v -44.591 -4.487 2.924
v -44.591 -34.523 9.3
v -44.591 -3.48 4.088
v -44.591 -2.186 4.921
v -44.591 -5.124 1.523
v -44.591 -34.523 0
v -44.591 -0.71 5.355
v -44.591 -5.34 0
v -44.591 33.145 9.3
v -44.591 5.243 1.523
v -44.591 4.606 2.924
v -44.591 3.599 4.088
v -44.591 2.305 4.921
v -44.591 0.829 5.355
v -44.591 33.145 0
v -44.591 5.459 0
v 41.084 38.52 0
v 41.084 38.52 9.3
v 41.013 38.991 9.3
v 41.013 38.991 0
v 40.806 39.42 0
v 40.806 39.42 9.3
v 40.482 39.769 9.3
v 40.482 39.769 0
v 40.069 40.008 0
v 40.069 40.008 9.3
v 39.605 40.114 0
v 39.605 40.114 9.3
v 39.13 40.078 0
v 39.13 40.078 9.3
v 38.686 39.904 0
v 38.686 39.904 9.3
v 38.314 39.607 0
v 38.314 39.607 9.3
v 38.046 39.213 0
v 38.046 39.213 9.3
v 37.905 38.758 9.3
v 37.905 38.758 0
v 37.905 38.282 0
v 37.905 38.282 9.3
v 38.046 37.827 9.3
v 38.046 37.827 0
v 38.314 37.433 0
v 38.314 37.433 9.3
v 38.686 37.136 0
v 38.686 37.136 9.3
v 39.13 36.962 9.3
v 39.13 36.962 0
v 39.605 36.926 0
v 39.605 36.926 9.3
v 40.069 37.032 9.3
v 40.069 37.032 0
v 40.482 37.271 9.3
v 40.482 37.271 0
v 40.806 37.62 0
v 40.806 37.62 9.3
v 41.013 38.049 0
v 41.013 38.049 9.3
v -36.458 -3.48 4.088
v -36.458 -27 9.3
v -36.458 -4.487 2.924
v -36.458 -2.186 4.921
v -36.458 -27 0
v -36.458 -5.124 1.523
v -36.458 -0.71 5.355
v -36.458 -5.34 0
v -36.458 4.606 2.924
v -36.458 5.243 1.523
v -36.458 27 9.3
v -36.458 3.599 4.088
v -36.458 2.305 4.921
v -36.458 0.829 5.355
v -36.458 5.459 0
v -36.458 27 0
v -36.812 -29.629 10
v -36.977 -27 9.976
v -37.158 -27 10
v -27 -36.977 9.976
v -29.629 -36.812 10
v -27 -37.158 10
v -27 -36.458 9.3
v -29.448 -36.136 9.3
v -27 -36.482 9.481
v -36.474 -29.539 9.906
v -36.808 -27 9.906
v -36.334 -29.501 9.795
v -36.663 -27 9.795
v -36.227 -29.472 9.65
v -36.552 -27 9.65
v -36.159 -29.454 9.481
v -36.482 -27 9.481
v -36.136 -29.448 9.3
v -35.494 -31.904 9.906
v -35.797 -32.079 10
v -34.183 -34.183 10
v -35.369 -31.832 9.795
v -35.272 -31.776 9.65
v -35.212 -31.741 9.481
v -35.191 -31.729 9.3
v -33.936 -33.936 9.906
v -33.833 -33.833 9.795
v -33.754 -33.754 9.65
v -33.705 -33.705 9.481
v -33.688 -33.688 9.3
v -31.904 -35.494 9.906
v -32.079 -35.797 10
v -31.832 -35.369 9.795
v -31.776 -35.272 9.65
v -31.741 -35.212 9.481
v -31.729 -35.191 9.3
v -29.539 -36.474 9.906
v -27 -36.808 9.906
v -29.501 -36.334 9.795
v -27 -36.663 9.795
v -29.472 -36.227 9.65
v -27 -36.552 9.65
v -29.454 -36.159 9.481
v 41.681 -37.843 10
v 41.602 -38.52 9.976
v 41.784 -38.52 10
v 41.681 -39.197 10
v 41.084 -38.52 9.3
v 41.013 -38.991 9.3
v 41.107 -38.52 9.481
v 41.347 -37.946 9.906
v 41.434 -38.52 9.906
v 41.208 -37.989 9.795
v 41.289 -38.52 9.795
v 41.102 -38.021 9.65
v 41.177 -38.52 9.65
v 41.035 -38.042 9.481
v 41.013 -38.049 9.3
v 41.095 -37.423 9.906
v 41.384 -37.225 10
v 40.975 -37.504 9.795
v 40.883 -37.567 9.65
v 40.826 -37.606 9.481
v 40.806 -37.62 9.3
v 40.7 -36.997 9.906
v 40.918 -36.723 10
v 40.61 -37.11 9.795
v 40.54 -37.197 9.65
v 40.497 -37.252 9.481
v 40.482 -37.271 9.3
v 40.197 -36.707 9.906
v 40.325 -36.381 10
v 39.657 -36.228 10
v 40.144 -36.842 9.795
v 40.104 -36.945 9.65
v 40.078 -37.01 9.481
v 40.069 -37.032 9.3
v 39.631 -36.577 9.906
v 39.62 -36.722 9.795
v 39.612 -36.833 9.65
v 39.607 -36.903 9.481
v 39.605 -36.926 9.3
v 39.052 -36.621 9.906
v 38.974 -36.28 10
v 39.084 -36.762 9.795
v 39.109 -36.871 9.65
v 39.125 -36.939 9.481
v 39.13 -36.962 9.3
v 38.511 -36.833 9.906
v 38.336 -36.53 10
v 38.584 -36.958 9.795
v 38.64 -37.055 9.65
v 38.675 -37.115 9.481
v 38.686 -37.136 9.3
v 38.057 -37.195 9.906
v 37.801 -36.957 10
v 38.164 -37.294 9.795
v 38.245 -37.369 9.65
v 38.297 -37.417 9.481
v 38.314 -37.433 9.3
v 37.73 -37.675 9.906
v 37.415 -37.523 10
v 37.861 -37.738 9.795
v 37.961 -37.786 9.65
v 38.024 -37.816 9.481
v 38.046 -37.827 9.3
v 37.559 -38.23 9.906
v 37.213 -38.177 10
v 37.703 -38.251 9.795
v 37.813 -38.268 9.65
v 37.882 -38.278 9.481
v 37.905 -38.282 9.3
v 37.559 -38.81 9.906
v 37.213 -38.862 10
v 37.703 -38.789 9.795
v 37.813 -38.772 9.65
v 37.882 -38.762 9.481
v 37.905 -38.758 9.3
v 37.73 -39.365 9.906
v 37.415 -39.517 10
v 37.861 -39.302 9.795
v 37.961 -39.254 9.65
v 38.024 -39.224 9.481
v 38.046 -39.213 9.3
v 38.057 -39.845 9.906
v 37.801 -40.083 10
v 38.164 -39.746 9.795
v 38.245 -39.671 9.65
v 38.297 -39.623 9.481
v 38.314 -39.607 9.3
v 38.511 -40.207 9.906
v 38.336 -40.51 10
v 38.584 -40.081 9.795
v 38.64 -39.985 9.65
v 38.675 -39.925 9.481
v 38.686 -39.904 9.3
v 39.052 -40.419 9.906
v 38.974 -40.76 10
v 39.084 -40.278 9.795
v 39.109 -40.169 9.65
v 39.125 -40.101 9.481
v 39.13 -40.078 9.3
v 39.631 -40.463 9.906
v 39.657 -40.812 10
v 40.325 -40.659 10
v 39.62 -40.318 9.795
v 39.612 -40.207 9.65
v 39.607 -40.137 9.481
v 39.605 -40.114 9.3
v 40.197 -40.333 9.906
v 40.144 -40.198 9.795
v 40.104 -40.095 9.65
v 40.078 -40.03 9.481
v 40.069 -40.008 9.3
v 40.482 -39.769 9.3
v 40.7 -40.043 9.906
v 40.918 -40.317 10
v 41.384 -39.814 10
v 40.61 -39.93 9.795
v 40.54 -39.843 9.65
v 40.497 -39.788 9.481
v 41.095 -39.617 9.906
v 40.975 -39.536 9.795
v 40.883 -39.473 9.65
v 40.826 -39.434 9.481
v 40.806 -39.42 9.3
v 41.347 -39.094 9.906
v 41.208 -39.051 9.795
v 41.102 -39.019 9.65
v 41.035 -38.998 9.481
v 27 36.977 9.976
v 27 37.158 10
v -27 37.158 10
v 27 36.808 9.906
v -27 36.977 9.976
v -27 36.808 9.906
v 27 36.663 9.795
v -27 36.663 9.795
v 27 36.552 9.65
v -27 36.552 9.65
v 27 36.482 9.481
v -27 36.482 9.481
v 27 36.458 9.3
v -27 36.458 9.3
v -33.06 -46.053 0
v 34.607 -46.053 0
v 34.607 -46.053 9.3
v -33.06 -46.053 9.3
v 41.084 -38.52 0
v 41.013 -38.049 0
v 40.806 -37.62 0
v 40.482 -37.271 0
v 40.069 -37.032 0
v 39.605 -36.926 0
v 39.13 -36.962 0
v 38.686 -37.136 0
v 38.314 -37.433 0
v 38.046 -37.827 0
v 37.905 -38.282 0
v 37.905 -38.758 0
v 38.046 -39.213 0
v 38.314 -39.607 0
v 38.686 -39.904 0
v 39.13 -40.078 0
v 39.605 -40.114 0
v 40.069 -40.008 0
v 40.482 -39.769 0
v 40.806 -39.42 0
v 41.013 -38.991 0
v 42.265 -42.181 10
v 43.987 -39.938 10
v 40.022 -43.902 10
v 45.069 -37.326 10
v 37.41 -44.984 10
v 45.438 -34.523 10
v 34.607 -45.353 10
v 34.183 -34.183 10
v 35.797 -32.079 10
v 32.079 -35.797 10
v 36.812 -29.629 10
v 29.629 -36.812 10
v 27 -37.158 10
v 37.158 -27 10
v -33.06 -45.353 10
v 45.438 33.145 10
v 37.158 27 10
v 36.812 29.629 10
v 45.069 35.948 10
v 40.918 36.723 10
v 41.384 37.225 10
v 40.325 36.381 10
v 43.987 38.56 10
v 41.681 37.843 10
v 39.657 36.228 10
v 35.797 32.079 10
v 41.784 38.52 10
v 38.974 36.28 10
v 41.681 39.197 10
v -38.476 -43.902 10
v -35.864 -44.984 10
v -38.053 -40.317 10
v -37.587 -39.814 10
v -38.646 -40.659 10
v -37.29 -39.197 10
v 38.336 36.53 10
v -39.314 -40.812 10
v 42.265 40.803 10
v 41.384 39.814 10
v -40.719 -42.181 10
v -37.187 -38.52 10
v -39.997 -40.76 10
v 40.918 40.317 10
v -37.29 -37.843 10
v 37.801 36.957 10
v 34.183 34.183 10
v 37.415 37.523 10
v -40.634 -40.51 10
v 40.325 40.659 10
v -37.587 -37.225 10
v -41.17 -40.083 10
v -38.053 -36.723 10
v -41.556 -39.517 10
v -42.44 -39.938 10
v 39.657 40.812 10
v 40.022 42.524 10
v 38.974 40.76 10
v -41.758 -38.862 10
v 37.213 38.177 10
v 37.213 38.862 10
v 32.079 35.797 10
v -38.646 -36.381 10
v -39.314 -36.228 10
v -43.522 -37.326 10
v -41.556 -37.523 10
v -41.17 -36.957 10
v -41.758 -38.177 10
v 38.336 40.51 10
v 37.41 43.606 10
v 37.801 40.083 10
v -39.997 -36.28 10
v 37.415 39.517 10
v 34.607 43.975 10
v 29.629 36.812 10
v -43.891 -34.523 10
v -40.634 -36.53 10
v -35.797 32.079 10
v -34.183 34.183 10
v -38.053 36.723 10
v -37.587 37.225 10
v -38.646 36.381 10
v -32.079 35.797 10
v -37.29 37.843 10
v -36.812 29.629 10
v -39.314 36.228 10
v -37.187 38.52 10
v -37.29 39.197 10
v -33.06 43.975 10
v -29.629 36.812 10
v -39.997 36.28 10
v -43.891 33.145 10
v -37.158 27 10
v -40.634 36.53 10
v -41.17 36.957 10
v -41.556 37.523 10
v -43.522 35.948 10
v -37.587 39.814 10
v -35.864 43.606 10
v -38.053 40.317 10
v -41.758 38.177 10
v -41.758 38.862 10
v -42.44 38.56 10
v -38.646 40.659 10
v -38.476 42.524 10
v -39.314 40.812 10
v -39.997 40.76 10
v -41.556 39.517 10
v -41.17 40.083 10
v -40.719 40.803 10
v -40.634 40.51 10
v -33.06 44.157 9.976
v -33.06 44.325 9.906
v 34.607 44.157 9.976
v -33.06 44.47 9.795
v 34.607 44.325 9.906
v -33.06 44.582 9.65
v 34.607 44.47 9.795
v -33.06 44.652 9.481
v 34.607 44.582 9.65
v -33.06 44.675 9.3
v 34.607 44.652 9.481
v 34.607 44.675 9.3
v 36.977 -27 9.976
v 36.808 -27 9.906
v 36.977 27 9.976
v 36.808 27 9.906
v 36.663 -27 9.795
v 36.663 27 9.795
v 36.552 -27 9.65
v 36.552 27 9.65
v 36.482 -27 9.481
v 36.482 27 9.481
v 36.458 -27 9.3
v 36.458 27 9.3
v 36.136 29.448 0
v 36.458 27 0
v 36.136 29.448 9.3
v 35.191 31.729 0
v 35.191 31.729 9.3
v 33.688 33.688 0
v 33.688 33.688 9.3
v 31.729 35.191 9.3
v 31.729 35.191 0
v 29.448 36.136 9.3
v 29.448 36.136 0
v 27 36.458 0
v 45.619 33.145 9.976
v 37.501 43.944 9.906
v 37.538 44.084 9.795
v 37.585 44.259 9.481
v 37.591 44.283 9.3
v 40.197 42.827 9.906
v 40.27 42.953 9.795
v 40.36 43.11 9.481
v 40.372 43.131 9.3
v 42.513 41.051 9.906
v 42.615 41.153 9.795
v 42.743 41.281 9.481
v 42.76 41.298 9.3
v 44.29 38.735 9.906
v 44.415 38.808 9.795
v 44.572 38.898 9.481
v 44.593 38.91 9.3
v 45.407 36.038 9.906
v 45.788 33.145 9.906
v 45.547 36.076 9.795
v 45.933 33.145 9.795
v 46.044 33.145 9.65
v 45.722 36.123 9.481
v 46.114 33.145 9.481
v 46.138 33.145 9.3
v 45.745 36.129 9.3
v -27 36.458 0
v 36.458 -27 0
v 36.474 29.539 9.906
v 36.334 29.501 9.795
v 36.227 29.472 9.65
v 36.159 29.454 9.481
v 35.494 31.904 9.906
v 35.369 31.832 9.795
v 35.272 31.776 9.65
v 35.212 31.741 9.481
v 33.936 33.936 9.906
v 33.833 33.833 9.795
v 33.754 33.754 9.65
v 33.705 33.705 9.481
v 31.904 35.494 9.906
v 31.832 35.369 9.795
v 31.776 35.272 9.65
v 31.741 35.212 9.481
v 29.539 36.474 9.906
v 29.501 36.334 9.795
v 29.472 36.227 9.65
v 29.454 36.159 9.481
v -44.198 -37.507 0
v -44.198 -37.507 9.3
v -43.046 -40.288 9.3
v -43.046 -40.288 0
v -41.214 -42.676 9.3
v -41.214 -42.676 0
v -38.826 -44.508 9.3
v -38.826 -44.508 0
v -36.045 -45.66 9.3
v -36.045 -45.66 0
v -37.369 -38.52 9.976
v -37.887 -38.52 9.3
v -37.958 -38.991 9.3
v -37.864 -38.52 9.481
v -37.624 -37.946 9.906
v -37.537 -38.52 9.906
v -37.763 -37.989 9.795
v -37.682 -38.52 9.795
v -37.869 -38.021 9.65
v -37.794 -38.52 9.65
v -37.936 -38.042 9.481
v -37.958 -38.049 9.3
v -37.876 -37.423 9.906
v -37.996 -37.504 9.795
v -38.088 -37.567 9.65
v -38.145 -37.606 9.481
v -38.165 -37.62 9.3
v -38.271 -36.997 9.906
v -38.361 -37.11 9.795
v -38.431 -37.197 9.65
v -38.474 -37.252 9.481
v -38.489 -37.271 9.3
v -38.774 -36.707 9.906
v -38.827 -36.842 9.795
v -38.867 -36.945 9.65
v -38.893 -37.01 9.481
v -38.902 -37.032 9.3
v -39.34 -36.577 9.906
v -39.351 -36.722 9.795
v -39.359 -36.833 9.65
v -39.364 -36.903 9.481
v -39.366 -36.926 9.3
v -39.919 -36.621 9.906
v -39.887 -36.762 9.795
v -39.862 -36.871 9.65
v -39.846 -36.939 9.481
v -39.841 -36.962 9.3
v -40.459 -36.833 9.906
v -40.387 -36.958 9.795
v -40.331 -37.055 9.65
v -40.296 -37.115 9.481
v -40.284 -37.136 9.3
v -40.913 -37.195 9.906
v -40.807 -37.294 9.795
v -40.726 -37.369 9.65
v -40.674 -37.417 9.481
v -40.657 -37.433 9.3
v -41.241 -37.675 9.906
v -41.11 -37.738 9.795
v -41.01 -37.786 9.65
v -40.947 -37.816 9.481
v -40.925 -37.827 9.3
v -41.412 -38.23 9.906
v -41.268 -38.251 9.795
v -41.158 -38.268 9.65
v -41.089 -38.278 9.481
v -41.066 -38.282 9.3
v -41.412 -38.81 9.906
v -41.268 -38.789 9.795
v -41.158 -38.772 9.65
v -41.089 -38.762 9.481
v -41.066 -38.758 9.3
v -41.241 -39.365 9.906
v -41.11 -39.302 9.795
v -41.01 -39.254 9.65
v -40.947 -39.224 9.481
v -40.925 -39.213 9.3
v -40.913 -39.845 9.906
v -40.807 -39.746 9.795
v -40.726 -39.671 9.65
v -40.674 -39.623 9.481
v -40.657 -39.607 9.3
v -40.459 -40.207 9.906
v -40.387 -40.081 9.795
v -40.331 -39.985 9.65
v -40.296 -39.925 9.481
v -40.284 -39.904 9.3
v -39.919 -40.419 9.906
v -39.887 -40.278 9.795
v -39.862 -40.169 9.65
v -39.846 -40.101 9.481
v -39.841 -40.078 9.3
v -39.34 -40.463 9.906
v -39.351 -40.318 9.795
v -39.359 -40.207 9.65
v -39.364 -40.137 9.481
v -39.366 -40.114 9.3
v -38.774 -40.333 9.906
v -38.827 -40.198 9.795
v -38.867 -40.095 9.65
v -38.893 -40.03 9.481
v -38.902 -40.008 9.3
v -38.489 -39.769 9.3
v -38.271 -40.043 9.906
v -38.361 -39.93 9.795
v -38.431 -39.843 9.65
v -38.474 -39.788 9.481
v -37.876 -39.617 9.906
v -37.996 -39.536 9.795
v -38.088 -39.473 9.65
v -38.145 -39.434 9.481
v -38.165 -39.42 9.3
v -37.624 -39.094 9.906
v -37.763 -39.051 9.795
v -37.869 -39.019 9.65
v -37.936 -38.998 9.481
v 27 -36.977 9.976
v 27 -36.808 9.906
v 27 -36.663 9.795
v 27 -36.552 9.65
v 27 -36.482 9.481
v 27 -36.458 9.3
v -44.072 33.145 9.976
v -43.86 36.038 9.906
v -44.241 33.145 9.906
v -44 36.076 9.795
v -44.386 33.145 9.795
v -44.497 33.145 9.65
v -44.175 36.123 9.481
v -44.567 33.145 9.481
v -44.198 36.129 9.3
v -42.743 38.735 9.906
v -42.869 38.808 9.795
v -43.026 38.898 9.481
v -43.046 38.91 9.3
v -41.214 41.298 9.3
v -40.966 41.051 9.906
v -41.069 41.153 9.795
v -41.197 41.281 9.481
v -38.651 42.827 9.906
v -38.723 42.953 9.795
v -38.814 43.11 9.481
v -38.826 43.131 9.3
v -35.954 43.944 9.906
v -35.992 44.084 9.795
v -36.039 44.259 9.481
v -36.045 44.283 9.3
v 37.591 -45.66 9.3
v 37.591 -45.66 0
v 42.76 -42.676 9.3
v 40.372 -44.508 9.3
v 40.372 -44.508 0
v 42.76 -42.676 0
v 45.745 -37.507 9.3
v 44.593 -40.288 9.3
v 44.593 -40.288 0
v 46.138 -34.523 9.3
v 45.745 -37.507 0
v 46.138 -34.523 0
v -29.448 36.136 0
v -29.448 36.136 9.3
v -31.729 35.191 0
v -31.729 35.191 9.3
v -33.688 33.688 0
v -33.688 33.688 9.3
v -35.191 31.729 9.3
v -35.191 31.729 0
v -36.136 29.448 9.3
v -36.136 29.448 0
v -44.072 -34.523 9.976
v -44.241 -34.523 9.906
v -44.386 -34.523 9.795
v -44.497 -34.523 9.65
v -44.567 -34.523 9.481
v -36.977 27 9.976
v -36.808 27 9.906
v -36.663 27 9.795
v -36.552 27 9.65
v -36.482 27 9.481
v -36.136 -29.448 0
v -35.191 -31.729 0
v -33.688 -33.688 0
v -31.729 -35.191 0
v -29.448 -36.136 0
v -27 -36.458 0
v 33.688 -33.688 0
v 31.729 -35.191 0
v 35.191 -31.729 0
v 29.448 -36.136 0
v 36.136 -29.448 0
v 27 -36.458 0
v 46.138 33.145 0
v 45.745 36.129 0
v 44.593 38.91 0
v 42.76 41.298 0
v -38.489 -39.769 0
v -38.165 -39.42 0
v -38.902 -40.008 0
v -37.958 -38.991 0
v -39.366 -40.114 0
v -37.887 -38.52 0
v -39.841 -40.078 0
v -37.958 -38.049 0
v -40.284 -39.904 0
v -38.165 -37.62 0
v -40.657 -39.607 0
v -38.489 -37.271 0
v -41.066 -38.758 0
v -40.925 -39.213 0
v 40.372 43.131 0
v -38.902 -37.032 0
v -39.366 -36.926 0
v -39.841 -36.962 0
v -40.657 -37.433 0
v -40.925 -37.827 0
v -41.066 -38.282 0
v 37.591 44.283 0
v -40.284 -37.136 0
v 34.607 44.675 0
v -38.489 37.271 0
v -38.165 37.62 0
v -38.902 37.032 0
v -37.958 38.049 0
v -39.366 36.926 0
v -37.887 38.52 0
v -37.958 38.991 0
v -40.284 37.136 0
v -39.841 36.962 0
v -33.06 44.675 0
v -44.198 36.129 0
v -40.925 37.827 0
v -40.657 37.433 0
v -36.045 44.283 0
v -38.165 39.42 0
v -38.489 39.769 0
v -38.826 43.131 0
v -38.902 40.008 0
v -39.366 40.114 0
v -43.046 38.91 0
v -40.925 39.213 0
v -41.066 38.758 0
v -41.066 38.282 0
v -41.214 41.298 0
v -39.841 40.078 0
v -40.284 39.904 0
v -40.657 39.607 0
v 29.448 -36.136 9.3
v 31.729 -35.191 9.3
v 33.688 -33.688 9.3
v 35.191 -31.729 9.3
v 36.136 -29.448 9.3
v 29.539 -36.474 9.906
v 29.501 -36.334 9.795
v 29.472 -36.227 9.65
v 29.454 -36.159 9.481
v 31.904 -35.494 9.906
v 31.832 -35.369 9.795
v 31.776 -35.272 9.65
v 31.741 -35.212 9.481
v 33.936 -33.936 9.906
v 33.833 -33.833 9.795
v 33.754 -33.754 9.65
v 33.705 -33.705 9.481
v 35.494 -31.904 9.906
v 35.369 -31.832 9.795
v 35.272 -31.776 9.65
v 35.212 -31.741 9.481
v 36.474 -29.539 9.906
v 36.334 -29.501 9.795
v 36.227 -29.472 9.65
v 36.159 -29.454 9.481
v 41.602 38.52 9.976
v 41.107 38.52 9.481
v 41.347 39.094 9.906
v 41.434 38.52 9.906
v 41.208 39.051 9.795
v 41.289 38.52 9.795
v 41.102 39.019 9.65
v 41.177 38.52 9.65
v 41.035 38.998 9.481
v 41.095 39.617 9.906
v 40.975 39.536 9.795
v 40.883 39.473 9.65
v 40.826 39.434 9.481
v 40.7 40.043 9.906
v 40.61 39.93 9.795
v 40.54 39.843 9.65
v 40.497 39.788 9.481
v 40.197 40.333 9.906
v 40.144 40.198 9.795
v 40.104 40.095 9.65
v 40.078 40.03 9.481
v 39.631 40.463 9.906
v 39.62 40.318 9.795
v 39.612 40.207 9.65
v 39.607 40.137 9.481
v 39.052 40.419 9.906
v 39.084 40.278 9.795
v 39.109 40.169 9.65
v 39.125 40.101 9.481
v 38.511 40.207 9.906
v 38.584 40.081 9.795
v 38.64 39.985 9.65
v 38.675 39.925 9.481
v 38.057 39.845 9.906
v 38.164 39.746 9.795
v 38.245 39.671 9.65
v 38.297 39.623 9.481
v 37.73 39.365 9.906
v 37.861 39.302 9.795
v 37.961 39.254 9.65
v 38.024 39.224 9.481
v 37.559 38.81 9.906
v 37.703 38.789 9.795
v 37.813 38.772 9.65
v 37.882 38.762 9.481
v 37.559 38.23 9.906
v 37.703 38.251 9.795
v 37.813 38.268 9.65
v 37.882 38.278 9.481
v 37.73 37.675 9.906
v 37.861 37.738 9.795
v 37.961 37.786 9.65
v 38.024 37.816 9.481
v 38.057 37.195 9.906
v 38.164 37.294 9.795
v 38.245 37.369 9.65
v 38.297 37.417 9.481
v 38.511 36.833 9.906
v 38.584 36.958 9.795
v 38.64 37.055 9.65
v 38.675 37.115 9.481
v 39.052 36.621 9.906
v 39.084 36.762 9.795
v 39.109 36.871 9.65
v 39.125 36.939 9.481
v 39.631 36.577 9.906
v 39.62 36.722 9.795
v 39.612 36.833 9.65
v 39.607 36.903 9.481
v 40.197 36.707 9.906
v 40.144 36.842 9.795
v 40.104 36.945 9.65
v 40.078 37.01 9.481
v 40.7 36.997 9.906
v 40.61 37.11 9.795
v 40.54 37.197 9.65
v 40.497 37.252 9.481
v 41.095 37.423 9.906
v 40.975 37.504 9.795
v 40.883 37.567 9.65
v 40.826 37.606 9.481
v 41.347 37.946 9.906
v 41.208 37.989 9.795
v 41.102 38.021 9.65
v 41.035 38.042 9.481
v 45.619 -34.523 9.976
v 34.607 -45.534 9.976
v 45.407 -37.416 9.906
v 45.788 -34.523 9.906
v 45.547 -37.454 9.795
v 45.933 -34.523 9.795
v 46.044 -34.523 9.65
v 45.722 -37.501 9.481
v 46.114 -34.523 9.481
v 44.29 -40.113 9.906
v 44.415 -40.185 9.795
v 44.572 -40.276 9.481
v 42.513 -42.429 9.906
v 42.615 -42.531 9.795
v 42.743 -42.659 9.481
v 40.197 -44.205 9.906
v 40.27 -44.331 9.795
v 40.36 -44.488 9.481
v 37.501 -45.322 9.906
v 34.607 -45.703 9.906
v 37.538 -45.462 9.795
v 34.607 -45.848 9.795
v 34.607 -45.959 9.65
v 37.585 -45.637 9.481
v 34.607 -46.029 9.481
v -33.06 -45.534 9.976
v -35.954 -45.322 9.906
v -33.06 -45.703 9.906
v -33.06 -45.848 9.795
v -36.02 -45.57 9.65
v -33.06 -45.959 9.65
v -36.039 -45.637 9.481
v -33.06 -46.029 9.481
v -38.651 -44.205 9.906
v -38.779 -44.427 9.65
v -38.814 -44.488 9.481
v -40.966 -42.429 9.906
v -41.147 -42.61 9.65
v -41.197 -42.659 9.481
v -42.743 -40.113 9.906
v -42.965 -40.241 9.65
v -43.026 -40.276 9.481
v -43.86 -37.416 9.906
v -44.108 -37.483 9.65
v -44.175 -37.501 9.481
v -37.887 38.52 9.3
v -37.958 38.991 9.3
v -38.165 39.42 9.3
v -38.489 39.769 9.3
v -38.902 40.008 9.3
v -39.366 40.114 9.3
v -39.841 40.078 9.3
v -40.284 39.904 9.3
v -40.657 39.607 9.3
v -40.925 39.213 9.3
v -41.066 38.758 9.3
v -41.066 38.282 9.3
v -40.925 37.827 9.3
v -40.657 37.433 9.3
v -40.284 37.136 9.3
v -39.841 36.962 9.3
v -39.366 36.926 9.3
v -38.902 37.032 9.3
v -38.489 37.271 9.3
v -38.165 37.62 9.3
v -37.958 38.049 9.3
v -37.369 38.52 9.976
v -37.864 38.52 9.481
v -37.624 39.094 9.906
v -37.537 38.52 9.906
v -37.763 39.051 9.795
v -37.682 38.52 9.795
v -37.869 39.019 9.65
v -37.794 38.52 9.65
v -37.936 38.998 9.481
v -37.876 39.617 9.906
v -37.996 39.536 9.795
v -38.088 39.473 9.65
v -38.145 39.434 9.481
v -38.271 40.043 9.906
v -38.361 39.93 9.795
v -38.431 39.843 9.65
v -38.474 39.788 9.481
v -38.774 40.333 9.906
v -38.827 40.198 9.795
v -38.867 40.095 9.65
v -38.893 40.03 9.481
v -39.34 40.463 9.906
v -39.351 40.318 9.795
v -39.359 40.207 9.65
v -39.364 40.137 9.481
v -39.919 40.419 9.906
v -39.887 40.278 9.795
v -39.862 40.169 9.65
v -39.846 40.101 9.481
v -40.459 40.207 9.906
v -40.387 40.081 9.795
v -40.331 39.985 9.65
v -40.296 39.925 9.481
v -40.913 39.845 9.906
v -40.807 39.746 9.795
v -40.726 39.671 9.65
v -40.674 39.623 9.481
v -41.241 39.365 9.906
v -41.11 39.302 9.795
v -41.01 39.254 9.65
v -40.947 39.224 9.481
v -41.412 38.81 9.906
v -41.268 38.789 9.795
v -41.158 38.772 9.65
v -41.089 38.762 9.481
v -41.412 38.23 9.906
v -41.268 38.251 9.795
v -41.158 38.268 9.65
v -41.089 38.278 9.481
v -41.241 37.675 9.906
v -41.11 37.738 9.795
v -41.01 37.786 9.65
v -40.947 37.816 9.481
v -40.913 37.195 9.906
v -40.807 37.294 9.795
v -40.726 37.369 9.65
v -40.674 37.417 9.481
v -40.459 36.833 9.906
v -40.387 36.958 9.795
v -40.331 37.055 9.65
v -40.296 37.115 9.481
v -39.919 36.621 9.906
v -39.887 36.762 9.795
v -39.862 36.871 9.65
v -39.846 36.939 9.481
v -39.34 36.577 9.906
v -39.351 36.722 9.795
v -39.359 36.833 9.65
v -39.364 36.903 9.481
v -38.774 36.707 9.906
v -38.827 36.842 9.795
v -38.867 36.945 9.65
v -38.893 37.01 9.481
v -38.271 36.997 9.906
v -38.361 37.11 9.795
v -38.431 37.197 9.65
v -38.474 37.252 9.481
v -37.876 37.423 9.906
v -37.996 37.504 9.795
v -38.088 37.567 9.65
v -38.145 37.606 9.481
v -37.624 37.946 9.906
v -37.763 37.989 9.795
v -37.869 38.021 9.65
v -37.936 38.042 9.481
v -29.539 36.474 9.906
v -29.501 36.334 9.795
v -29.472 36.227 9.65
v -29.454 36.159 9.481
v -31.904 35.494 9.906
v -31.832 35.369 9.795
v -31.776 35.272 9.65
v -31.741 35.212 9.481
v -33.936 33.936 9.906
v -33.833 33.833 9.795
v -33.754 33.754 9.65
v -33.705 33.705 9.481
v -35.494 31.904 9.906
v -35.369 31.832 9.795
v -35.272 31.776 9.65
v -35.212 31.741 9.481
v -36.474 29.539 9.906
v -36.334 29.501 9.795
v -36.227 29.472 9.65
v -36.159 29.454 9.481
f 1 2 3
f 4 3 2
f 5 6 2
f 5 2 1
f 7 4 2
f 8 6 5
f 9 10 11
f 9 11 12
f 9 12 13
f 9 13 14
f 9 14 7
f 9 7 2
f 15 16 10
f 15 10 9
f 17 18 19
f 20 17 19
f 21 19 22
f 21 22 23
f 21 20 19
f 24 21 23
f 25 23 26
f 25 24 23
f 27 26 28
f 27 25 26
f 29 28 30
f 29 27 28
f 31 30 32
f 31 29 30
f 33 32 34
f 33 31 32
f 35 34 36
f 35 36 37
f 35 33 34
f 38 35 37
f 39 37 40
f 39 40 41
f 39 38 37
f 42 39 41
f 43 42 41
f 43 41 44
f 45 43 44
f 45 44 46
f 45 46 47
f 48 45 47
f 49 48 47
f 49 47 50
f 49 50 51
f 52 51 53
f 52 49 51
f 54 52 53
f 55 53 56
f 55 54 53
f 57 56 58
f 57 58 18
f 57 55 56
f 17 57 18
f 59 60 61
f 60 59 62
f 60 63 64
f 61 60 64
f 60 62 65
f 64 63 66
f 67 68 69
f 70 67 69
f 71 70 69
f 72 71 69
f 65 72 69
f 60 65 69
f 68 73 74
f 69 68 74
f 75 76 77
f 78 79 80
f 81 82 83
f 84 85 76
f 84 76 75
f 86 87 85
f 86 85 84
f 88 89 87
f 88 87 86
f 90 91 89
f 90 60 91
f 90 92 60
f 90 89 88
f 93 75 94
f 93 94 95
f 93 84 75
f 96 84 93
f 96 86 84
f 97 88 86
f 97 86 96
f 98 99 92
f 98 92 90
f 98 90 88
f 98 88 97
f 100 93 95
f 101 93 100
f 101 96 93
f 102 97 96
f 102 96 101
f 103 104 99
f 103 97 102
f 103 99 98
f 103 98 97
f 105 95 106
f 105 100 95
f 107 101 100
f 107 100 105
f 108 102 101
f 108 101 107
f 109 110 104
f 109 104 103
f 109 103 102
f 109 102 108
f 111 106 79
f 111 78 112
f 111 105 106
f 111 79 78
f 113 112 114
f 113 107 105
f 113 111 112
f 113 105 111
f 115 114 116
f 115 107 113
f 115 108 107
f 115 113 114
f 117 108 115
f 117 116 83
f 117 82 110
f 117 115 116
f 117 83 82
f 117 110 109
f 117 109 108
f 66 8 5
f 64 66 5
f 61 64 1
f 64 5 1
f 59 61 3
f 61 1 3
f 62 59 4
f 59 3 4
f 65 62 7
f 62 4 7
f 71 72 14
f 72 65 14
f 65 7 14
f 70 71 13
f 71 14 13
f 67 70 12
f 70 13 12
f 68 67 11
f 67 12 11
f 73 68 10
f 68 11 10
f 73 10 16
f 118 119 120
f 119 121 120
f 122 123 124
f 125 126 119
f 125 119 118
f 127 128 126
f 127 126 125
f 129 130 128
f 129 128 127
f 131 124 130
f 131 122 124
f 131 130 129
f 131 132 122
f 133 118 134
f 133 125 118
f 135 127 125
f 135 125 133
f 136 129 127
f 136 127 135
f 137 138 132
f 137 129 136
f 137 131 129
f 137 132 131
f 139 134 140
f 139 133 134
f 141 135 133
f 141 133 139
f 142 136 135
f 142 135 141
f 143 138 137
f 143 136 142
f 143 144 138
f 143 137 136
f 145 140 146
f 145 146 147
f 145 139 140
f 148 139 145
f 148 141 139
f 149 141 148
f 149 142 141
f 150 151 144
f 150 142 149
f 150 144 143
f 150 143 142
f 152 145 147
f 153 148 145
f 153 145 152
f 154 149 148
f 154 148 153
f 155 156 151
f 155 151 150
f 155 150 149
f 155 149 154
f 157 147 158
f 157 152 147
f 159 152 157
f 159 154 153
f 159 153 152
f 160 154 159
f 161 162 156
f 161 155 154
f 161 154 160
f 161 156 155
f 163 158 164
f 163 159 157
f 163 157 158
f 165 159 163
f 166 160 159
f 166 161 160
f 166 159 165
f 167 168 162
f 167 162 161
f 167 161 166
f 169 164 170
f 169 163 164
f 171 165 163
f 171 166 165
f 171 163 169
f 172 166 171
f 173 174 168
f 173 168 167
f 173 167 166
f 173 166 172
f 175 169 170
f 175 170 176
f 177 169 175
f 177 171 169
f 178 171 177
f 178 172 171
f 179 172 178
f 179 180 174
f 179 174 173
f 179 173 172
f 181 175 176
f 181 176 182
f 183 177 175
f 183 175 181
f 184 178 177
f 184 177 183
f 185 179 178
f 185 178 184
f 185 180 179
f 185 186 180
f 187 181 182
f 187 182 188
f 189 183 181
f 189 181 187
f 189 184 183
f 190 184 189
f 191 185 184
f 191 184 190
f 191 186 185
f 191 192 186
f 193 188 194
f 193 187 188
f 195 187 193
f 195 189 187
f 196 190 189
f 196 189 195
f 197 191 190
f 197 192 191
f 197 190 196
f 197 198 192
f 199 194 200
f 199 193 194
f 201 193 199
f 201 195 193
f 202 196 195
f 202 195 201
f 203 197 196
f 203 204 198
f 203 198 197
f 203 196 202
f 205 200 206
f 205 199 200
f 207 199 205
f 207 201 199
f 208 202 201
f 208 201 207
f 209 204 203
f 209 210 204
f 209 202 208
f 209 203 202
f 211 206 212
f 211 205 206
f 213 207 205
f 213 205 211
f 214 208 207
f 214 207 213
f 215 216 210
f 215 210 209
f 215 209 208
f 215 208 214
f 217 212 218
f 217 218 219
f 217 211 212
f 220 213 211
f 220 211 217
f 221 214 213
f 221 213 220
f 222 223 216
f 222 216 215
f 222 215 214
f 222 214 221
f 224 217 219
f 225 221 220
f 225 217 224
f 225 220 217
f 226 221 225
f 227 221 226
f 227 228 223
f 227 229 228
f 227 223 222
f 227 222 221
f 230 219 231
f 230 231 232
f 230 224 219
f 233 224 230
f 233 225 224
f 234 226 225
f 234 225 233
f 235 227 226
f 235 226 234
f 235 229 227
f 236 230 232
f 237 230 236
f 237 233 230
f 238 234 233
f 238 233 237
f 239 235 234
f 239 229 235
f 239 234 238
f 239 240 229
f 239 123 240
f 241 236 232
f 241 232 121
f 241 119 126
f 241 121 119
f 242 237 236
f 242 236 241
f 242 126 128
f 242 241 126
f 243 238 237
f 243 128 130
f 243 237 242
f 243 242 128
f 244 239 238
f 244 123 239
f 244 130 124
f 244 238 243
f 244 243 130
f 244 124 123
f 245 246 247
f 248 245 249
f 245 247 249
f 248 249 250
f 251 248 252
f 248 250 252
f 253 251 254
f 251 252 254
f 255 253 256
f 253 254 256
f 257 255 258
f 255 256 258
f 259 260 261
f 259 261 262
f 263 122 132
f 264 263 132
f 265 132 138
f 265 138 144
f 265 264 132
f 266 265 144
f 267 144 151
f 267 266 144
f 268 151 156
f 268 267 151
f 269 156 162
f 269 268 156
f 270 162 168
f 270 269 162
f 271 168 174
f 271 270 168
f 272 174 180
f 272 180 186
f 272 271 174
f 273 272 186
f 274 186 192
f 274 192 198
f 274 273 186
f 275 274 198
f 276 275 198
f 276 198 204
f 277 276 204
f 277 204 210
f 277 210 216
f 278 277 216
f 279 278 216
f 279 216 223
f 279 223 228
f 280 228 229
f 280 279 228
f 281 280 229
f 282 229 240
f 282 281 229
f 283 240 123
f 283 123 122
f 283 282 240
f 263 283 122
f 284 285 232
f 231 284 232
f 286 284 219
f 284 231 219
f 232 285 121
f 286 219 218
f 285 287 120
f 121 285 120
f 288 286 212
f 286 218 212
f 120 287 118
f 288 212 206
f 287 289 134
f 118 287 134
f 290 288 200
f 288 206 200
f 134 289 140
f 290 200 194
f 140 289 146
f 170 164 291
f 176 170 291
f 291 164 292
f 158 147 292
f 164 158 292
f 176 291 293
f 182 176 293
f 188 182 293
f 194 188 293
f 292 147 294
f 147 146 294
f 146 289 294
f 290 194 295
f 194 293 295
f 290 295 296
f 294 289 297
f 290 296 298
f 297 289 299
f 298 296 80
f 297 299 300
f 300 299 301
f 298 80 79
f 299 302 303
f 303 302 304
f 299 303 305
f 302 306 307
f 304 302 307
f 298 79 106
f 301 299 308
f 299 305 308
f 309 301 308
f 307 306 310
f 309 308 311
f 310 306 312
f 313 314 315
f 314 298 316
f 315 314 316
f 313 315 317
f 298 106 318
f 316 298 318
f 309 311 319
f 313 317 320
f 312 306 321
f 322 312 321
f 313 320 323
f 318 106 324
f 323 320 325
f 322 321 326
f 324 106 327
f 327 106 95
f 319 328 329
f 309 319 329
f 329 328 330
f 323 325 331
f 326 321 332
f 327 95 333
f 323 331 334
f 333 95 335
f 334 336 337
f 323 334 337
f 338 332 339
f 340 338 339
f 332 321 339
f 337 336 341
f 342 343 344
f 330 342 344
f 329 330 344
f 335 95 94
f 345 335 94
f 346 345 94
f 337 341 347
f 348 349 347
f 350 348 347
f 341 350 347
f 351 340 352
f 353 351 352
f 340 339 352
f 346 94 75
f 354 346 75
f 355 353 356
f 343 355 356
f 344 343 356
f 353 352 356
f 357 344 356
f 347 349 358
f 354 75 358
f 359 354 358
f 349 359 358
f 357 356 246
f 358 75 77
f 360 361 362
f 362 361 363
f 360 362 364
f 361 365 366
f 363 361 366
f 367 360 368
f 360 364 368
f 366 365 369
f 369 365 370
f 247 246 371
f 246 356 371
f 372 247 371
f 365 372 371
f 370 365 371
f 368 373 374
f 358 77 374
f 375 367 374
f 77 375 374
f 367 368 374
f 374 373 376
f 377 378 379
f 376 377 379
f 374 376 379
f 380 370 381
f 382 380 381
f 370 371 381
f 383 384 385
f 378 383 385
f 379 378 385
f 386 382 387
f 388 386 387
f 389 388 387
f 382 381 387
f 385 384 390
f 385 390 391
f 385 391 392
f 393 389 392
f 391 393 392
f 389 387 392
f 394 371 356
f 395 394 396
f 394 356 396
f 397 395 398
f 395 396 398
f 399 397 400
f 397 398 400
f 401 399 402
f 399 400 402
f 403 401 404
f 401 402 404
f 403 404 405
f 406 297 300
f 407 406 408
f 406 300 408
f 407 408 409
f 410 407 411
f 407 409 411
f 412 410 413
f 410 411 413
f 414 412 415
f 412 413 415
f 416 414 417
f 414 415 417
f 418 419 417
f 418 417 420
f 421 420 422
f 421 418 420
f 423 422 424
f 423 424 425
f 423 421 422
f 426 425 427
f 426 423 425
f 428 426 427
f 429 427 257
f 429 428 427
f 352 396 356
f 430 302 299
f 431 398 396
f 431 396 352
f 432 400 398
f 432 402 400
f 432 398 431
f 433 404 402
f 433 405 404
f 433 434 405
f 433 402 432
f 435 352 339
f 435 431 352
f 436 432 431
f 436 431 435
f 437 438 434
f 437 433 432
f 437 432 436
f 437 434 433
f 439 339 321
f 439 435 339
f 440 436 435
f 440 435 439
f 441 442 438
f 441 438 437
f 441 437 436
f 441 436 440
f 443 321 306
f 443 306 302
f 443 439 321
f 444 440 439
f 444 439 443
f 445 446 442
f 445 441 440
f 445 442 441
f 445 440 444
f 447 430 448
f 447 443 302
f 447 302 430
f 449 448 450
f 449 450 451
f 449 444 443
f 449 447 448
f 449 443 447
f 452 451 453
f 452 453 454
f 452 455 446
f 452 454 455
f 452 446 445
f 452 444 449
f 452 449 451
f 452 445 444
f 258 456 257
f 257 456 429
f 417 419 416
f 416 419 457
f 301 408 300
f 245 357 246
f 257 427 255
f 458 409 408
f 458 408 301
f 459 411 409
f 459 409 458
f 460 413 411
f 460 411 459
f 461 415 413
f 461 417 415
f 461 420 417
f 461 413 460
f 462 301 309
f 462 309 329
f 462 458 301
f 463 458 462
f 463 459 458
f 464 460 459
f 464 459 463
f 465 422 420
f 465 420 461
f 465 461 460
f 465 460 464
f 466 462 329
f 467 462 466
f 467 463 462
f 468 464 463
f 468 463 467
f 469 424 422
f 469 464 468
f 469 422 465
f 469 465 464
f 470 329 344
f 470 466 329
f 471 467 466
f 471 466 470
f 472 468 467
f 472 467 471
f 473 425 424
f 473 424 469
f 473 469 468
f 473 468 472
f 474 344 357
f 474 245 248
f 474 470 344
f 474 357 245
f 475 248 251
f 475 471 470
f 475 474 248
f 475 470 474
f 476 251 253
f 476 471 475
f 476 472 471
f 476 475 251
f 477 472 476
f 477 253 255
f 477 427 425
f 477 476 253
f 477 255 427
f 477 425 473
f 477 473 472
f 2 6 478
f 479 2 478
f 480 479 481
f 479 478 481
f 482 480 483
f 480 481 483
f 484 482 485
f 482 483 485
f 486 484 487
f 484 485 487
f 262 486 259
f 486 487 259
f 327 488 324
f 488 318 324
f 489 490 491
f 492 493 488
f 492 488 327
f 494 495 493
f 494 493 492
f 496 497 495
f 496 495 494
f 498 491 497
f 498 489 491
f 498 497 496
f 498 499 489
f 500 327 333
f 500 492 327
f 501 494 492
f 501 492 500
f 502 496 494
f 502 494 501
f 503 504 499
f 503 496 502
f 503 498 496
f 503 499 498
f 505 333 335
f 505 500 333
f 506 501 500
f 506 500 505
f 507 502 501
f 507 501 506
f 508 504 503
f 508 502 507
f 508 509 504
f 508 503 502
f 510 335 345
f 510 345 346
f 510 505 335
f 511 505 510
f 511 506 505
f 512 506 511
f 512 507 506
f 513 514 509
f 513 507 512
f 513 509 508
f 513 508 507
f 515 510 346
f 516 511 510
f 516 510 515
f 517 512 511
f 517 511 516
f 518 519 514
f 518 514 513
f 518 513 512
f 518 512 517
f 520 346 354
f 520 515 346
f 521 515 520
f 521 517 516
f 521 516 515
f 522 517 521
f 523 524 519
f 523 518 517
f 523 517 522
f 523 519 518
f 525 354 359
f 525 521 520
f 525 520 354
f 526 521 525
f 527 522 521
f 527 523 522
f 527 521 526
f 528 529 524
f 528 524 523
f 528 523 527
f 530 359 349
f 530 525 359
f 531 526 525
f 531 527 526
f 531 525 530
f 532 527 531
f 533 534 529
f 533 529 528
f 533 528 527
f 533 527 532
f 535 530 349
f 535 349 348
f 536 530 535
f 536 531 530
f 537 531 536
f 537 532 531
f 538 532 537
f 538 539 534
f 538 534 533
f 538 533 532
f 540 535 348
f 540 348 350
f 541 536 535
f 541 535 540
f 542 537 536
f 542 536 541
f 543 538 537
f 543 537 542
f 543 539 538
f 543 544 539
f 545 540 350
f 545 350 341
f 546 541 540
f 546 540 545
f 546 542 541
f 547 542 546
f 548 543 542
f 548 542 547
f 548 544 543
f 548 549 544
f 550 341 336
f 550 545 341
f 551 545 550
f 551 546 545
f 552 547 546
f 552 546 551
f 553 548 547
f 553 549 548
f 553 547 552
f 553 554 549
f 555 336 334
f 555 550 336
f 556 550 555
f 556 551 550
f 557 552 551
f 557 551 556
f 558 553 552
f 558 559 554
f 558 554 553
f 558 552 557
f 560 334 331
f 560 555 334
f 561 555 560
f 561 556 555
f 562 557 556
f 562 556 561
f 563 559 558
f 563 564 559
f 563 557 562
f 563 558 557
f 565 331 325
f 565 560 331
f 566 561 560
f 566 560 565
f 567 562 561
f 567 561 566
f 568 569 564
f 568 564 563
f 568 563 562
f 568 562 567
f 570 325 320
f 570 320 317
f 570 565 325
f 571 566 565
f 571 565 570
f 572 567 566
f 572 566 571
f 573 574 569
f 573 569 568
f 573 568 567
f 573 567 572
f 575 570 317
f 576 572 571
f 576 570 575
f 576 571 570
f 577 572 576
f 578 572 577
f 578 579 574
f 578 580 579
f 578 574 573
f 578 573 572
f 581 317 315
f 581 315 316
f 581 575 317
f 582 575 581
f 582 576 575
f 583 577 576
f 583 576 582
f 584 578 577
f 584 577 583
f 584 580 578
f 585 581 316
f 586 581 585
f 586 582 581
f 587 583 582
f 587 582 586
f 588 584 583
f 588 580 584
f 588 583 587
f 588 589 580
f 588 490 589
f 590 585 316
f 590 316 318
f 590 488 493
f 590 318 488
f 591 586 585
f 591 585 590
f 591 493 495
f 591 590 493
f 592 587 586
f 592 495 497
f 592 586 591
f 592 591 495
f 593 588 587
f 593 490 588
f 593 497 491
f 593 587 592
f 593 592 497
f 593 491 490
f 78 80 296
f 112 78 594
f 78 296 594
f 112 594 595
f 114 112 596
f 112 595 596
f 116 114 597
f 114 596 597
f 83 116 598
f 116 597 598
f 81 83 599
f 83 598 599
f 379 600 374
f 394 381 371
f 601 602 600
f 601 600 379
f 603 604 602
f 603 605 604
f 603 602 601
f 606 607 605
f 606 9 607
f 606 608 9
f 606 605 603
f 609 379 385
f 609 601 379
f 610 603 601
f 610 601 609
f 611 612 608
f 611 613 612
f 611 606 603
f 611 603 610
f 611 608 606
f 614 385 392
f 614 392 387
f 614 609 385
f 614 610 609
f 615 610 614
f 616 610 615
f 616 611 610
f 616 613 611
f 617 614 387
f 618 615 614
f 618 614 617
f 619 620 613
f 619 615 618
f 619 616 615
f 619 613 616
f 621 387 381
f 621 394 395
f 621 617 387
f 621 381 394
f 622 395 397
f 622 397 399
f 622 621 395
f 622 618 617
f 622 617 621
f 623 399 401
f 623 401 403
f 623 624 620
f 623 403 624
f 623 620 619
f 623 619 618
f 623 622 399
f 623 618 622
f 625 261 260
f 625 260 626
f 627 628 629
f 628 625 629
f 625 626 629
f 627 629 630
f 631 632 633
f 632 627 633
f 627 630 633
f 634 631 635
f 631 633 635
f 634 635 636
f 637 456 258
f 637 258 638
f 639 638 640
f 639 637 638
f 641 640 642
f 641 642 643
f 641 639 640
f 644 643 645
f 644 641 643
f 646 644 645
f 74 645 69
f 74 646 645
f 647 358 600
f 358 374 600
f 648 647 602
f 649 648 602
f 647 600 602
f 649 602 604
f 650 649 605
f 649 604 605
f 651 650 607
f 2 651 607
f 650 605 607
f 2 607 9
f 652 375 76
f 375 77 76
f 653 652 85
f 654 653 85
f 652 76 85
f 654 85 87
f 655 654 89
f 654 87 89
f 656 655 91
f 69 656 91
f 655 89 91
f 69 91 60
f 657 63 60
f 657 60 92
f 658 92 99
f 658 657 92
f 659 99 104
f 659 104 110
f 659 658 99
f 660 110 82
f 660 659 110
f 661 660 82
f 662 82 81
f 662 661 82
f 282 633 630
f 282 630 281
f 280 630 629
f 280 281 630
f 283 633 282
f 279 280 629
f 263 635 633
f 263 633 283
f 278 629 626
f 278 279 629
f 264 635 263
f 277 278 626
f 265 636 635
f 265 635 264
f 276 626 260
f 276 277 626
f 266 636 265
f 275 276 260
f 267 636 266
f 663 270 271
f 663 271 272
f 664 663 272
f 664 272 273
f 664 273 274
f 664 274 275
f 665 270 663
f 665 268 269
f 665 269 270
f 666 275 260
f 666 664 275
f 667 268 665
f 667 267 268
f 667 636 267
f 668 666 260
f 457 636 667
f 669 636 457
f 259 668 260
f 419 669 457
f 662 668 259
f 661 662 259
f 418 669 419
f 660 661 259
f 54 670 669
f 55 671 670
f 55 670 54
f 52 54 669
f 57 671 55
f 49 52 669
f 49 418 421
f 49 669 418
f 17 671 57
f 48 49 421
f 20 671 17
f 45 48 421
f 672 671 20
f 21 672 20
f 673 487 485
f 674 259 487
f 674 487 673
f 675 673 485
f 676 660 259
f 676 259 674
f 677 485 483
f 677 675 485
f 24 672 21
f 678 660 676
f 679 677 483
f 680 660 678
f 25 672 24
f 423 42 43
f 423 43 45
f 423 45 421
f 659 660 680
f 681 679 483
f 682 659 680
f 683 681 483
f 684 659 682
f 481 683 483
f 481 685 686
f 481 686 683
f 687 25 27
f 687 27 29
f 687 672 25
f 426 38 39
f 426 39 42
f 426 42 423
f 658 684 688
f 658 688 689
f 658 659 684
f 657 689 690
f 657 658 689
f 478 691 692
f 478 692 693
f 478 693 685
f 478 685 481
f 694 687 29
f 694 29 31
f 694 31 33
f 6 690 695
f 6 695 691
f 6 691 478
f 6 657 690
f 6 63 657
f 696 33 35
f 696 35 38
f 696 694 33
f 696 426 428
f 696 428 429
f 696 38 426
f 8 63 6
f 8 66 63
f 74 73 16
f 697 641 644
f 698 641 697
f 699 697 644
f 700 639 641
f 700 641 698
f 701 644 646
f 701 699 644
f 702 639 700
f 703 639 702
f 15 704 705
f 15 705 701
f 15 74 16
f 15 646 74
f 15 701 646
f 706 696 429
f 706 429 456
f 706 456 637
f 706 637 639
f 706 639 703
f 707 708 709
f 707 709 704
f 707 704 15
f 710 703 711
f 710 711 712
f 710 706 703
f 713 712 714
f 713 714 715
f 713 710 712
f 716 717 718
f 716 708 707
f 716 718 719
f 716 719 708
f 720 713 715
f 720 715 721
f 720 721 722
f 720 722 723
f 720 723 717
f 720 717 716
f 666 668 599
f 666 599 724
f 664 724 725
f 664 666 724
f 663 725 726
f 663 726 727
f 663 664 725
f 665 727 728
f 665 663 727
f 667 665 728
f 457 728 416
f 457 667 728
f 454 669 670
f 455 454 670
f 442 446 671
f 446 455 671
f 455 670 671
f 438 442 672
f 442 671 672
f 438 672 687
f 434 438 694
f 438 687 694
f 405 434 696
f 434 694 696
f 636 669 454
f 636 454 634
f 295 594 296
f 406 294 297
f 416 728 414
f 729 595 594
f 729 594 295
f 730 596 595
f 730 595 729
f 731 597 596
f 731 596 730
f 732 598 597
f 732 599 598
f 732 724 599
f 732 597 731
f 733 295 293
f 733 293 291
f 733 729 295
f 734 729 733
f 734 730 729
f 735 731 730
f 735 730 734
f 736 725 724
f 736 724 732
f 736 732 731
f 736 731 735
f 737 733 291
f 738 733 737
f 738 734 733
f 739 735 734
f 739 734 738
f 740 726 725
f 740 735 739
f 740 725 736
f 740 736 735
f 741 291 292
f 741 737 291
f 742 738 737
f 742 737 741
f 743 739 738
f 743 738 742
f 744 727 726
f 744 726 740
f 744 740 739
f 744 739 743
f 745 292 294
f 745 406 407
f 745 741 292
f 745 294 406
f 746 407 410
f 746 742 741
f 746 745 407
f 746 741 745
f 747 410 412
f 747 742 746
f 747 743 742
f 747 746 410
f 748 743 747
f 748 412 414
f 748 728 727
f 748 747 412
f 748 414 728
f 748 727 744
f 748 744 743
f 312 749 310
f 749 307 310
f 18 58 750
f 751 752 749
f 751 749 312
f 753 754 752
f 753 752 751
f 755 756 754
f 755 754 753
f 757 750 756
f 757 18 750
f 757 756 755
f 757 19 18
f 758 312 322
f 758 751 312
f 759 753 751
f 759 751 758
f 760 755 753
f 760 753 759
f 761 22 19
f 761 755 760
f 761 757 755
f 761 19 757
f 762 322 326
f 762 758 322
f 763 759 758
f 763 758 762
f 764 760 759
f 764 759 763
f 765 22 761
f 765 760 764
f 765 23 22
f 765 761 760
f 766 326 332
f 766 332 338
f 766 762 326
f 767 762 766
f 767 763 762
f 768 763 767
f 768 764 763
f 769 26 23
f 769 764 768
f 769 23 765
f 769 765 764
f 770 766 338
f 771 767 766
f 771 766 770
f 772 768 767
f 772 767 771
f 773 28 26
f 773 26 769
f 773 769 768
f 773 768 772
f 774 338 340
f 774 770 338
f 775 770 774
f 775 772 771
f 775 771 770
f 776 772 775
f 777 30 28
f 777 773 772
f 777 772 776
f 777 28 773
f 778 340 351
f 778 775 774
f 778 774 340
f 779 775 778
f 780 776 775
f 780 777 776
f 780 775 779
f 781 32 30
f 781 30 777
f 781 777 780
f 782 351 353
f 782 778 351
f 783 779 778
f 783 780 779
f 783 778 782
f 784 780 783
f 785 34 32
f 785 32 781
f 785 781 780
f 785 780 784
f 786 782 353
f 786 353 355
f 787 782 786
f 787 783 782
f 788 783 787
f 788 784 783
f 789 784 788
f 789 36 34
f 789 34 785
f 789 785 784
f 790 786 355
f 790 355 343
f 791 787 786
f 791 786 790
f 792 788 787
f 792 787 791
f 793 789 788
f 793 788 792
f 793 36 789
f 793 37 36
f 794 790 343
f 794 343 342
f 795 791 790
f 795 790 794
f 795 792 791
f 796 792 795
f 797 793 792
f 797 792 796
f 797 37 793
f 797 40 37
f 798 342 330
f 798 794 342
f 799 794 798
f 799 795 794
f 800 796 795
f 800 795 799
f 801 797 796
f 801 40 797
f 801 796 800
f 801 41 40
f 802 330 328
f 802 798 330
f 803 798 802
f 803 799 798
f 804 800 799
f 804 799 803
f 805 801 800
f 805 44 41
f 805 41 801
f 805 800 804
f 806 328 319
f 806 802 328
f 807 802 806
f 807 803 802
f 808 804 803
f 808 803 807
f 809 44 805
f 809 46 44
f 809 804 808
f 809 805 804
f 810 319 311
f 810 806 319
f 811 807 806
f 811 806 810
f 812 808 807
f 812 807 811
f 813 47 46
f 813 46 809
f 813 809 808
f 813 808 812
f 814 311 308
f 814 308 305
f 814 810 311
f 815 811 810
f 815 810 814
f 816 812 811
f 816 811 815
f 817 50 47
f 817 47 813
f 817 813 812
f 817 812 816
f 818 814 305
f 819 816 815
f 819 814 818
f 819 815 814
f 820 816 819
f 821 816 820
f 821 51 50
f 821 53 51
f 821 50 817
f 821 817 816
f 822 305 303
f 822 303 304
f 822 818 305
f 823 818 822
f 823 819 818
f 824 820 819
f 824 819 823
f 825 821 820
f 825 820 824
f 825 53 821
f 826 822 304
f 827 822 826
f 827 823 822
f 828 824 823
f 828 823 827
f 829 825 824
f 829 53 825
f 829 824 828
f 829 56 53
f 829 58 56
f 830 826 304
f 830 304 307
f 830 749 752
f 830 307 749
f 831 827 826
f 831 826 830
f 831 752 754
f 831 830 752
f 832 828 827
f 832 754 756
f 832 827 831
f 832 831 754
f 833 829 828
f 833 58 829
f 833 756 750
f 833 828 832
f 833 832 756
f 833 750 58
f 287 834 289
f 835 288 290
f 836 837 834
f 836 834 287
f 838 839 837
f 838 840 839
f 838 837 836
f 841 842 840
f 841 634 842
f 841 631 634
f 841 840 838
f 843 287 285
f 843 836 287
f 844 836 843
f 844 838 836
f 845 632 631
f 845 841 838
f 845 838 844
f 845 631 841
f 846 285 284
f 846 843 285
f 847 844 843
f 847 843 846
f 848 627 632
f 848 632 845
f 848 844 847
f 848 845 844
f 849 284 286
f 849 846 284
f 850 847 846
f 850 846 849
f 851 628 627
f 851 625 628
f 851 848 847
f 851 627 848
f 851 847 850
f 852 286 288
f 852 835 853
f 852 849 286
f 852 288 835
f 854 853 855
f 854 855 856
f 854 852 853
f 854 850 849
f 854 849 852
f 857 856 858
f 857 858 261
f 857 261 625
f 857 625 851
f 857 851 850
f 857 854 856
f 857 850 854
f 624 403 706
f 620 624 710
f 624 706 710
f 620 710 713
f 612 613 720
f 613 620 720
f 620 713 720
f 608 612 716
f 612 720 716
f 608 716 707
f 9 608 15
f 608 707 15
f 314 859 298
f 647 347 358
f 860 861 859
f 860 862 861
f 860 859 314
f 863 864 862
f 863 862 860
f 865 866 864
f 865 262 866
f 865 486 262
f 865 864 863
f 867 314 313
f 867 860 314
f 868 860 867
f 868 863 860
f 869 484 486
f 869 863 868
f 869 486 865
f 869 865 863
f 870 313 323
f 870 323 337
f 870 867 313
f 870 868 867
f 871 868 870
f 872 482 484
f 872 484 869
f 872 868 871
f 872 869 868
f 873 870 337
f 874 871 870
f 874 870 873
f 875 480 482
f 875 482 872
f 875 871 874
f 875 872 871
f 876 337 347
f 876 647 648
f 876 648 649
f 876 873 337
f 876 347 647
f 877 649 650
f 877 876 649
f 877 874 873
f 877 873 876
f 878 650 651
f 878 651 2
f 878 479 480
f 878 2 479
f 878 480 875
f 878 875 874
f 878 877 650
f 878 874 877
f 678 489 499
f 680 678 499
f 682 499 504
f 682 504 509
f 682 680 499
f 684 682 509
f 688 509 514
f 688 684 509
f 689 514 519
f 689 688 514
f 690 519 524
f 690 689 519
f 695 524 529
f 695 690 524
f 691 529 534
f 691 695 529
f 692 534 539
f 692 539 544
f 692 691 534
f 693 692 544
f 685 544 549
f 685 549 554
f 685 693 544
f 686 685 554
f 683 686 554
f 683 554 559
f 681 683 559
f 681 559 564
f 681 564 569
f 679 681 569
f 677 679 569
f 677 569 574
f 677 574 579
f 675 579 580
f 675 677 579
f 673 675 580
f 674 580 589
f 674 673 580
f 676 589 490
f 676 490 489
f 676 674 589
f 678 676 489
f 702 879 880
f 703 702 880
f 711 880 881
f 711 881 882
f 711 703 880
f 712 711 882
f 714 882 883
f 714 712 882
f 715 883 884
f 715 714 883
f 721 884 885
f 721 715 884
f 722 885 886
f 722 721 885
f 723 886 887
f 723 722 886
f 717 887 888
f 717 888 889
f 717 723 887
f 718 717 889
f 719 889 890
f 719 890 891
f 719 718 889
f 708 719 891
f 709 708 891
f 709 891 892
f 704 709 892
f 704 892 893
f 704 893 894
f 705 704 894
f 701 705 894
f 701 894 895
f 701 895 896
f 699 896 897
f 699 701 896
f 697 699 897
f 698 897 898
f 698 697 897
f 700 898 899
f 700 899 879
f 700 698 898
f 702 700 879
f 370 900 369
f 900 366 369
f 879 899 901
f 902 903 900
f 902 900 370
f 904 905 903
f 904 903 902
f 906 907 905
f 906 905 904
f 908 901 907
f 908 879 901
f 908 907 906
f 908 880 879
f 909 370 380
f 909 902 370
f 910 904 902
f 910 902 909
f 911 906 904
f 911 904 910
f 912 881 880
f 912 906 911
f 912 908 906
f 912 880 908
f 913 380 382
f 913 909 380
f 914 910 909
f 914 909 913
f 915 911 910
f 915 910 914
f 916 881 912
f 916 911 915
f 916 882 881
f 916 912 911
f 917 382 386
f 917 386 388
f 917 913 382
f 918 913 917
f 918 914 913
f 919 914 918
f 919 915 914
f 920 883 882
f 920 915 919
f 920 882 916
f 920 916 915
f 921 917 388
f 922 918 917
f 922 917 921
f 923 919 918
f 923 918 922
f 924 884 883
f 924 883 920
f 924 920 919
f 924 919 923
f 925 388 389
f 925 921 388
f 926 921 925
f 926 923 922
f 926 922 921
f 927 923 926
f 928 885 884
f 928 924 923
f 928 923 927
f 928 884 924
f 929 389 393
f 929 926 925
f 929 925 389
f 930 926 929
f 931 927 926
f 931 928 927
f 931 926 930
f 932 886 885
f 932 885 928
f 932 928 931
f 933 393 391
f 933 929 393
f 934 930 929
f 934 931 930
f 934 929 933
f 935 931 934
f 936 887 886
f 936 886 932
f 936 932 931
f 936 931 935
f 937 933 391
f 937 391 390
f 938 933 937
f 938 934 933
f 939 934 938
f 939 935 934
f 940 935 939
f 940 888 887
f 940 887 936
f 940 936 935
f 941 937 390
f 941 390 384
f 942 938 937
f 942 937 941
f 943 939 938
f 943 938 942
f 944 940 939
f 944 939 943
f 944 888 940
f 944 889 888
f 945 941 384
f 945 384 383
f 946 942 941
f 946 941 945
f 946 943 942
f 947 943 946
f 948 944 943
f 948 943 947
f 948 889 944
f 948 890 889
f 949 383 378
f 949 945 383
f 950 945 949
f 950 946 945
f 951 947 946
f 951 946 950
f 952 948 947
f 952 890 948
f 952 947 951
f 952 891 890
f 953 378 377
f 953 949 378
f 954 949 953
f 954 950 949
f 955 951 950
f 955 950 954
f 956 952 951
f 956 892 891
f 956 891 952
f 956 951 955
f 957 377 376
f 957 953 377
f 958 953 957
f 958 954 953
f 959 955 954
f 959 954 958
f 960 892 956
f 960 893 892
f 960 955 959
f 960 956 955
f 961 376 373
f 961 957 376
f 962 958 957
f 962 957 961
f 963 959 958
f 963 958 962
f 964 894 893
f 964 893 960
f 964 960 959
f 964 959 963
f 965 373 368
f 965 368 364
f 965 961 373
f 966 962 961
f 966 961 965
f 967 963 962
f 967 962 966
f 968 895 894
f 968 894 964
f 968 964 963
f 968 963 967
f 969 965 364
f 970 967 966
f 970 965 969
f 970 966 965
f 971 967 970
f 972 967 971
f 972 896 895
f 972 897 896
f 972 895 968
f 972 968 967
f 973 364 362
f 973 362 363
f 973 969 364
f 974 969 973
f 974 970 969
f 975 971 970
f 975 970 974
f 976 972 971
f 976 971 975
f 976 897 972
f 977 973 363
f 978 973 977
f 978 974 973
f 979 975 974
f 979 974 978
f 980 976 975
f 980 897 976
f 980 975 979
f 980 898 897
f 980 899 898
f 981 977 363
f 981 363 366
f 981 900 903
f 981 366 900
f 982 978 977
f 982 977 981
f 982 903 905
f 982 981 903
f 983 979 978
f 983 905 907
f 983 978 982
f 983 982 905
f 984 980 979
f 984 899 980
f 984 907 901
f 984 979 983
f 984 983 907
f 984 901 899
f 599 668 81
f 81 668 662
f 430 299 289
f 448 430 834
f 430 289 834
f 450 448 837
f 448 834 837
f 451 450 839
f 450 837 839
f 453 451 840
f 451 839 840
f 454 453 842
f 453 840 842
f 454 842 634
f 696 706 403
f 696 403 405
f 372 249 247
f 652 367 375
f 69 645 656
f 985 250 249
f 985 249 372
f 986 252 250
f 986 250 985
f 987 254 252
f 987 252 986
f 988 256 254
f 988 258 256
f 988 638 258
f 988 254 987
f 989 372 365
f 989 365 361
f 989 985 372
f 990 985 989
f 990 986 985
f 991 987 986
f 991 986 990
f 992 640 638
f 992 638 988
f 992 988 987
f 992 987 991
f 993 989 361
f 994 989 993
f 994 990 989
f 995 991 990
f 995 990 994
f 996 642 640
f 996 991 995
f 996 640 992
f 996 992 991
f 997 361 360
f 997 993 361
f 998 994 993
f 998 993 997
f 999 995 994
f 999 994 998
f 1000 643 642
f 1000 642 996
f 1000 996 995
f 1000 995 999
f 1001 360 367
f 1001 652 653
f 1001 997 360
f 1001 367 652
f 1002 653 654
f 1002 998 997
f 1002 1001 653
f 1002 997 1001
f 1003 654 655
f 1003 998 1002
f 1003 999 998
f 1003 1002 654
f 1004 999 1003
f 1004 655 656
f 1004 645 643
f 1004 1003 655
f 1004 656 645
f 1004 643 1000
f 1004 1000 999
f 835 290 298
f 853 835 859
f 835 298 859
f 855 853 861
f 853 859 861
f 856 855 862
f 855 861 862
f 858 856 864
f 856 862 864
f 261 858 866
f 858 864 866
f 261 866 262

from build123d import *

# Parameters (mm, degrees)
SKETCH_R     = 1.59803
PAD_DEPTH    = 10
SKETCH001_R  = 5.399803
POCKET_DEPTH = 10
FILLET_R     = 0.7


with BuildPart() as part:
    # Sketch → Pad (new body)
    with BuildSketch(Plane.XY):
        with BuildLine():
            Line((-33.060326, 44.675403), (34.606833, 44.675403))
            ThreePointArc((46.13759, 33.144646), (42.76031, 41.298123), (34.606833, 44.675403))
            Line((46.13759, 33.144646), (46.13759, -34.522513))
            ThreePointArc((34.606833, -46.05327), (42.76031, -42.675989), (46.13759, -34.522513))
            Line((34.606833, -46.05327), (-33.060326, -46.05327))
            ThreePointArc((-44.591083, -34.522513), (-41.213802, -42.675989), (-33.060326, -46.05327))
            Line((-44.591083, -34.522513), (-44.591083, 33.144646))
            ThreePointArc((-33.060326, 44.675403), (-41.213802, 41.298123), (-44.591083, 33.144646))
        make_face()
        with Locations((-39.485482, 38.519965)):
            Circle(SKETCH_R, mode=Mode.SUBTRACT)
        with Locations((39.485482, 38.519965)):
            Circle(SKETCH_R, mode=Mode.SUBTRACT)
        with Locations((39.485482, -38.519965)):
            Circle(SKETCH_R, mode=Mode.SUBTRACT)
        with Locations((-39.485482, -38.519965)):
            Circle(SKETCH_R, mode=Mode.SUBTRACT)
        with BuildLine():
            Line((-27, 36.458412), (27, 36.458412))
            ThreePointArc((36.458412, 27), (33.688107, 33.688107), (27, 36.458412))
            Line((36.458412, 27), (36.458412, -27))
            ThreePointArc((27, -36.458412), (33.688107, -33.688107), (36.458412, -27))
            Line((27, -36.458412), (-27, -36.458412))
            ThreePointArc((-36.458412, -27), (-33.688107, -33.688107), (-27, -36.458412))
            Line((-36.458412, -27), (-36.458412, 27))
            ThreePointArc((-27, 36.458412), (-33.688107, 33.688107), (-36.458412, 27))
        make_face(mode=Mode.SUBTRACT)
    extrude(amount=PAD_DEPTH)

    # Sketch001 → Pocket (cut)
    with BuildSketch(Plane(origin=(-44.591083, 0, 0), x_dir=(0, -1, 0), z_dir=(-1, 0, 0))):
        with Locations((-0.059414, 0.010164)):
            Circle(SKETCH001_R)
    extrude(amount=-POCKET_DEPTH, mode=Mode.SUBTRACT)

    # Fillet
    fillet_edges = [part.edges().sort_by_distance(p)[0] for p in [
        (-44.591083, -0.688933, 10),
        (-41.213802, 41.298123, 10),
        (0.773254, 44.675403, 10),
        (42.76031, 41.298123, 10),
        (46.13759, -0.688933, 10),
        (42.76031, -42.675989, 10),
        (0.773254, -46.05327, 10),
        (-41.213802, -42.675989, 10),
        (-33.688107, -33.688107, 10),
        (0, -36.458412, 10),
        (33.688107, -33.688107, 10),
        (36.458412, 0, 10),
        (33.688107, 33.688107, 10),
        (0, 36.458412, 10),
        (-33.688107, 33.688107, 10),
        (-36.458412, 0, 10),
        (-41.083512, -38.519965, 10),
        (37.887452, -38.519965, 10),
        (37.887452, 38.519965, 10),
        (-41.083512, 38.519965, 10),
    ]]
    fillet(fillet_edges, radius=FILLET_R)


solid = part.part
